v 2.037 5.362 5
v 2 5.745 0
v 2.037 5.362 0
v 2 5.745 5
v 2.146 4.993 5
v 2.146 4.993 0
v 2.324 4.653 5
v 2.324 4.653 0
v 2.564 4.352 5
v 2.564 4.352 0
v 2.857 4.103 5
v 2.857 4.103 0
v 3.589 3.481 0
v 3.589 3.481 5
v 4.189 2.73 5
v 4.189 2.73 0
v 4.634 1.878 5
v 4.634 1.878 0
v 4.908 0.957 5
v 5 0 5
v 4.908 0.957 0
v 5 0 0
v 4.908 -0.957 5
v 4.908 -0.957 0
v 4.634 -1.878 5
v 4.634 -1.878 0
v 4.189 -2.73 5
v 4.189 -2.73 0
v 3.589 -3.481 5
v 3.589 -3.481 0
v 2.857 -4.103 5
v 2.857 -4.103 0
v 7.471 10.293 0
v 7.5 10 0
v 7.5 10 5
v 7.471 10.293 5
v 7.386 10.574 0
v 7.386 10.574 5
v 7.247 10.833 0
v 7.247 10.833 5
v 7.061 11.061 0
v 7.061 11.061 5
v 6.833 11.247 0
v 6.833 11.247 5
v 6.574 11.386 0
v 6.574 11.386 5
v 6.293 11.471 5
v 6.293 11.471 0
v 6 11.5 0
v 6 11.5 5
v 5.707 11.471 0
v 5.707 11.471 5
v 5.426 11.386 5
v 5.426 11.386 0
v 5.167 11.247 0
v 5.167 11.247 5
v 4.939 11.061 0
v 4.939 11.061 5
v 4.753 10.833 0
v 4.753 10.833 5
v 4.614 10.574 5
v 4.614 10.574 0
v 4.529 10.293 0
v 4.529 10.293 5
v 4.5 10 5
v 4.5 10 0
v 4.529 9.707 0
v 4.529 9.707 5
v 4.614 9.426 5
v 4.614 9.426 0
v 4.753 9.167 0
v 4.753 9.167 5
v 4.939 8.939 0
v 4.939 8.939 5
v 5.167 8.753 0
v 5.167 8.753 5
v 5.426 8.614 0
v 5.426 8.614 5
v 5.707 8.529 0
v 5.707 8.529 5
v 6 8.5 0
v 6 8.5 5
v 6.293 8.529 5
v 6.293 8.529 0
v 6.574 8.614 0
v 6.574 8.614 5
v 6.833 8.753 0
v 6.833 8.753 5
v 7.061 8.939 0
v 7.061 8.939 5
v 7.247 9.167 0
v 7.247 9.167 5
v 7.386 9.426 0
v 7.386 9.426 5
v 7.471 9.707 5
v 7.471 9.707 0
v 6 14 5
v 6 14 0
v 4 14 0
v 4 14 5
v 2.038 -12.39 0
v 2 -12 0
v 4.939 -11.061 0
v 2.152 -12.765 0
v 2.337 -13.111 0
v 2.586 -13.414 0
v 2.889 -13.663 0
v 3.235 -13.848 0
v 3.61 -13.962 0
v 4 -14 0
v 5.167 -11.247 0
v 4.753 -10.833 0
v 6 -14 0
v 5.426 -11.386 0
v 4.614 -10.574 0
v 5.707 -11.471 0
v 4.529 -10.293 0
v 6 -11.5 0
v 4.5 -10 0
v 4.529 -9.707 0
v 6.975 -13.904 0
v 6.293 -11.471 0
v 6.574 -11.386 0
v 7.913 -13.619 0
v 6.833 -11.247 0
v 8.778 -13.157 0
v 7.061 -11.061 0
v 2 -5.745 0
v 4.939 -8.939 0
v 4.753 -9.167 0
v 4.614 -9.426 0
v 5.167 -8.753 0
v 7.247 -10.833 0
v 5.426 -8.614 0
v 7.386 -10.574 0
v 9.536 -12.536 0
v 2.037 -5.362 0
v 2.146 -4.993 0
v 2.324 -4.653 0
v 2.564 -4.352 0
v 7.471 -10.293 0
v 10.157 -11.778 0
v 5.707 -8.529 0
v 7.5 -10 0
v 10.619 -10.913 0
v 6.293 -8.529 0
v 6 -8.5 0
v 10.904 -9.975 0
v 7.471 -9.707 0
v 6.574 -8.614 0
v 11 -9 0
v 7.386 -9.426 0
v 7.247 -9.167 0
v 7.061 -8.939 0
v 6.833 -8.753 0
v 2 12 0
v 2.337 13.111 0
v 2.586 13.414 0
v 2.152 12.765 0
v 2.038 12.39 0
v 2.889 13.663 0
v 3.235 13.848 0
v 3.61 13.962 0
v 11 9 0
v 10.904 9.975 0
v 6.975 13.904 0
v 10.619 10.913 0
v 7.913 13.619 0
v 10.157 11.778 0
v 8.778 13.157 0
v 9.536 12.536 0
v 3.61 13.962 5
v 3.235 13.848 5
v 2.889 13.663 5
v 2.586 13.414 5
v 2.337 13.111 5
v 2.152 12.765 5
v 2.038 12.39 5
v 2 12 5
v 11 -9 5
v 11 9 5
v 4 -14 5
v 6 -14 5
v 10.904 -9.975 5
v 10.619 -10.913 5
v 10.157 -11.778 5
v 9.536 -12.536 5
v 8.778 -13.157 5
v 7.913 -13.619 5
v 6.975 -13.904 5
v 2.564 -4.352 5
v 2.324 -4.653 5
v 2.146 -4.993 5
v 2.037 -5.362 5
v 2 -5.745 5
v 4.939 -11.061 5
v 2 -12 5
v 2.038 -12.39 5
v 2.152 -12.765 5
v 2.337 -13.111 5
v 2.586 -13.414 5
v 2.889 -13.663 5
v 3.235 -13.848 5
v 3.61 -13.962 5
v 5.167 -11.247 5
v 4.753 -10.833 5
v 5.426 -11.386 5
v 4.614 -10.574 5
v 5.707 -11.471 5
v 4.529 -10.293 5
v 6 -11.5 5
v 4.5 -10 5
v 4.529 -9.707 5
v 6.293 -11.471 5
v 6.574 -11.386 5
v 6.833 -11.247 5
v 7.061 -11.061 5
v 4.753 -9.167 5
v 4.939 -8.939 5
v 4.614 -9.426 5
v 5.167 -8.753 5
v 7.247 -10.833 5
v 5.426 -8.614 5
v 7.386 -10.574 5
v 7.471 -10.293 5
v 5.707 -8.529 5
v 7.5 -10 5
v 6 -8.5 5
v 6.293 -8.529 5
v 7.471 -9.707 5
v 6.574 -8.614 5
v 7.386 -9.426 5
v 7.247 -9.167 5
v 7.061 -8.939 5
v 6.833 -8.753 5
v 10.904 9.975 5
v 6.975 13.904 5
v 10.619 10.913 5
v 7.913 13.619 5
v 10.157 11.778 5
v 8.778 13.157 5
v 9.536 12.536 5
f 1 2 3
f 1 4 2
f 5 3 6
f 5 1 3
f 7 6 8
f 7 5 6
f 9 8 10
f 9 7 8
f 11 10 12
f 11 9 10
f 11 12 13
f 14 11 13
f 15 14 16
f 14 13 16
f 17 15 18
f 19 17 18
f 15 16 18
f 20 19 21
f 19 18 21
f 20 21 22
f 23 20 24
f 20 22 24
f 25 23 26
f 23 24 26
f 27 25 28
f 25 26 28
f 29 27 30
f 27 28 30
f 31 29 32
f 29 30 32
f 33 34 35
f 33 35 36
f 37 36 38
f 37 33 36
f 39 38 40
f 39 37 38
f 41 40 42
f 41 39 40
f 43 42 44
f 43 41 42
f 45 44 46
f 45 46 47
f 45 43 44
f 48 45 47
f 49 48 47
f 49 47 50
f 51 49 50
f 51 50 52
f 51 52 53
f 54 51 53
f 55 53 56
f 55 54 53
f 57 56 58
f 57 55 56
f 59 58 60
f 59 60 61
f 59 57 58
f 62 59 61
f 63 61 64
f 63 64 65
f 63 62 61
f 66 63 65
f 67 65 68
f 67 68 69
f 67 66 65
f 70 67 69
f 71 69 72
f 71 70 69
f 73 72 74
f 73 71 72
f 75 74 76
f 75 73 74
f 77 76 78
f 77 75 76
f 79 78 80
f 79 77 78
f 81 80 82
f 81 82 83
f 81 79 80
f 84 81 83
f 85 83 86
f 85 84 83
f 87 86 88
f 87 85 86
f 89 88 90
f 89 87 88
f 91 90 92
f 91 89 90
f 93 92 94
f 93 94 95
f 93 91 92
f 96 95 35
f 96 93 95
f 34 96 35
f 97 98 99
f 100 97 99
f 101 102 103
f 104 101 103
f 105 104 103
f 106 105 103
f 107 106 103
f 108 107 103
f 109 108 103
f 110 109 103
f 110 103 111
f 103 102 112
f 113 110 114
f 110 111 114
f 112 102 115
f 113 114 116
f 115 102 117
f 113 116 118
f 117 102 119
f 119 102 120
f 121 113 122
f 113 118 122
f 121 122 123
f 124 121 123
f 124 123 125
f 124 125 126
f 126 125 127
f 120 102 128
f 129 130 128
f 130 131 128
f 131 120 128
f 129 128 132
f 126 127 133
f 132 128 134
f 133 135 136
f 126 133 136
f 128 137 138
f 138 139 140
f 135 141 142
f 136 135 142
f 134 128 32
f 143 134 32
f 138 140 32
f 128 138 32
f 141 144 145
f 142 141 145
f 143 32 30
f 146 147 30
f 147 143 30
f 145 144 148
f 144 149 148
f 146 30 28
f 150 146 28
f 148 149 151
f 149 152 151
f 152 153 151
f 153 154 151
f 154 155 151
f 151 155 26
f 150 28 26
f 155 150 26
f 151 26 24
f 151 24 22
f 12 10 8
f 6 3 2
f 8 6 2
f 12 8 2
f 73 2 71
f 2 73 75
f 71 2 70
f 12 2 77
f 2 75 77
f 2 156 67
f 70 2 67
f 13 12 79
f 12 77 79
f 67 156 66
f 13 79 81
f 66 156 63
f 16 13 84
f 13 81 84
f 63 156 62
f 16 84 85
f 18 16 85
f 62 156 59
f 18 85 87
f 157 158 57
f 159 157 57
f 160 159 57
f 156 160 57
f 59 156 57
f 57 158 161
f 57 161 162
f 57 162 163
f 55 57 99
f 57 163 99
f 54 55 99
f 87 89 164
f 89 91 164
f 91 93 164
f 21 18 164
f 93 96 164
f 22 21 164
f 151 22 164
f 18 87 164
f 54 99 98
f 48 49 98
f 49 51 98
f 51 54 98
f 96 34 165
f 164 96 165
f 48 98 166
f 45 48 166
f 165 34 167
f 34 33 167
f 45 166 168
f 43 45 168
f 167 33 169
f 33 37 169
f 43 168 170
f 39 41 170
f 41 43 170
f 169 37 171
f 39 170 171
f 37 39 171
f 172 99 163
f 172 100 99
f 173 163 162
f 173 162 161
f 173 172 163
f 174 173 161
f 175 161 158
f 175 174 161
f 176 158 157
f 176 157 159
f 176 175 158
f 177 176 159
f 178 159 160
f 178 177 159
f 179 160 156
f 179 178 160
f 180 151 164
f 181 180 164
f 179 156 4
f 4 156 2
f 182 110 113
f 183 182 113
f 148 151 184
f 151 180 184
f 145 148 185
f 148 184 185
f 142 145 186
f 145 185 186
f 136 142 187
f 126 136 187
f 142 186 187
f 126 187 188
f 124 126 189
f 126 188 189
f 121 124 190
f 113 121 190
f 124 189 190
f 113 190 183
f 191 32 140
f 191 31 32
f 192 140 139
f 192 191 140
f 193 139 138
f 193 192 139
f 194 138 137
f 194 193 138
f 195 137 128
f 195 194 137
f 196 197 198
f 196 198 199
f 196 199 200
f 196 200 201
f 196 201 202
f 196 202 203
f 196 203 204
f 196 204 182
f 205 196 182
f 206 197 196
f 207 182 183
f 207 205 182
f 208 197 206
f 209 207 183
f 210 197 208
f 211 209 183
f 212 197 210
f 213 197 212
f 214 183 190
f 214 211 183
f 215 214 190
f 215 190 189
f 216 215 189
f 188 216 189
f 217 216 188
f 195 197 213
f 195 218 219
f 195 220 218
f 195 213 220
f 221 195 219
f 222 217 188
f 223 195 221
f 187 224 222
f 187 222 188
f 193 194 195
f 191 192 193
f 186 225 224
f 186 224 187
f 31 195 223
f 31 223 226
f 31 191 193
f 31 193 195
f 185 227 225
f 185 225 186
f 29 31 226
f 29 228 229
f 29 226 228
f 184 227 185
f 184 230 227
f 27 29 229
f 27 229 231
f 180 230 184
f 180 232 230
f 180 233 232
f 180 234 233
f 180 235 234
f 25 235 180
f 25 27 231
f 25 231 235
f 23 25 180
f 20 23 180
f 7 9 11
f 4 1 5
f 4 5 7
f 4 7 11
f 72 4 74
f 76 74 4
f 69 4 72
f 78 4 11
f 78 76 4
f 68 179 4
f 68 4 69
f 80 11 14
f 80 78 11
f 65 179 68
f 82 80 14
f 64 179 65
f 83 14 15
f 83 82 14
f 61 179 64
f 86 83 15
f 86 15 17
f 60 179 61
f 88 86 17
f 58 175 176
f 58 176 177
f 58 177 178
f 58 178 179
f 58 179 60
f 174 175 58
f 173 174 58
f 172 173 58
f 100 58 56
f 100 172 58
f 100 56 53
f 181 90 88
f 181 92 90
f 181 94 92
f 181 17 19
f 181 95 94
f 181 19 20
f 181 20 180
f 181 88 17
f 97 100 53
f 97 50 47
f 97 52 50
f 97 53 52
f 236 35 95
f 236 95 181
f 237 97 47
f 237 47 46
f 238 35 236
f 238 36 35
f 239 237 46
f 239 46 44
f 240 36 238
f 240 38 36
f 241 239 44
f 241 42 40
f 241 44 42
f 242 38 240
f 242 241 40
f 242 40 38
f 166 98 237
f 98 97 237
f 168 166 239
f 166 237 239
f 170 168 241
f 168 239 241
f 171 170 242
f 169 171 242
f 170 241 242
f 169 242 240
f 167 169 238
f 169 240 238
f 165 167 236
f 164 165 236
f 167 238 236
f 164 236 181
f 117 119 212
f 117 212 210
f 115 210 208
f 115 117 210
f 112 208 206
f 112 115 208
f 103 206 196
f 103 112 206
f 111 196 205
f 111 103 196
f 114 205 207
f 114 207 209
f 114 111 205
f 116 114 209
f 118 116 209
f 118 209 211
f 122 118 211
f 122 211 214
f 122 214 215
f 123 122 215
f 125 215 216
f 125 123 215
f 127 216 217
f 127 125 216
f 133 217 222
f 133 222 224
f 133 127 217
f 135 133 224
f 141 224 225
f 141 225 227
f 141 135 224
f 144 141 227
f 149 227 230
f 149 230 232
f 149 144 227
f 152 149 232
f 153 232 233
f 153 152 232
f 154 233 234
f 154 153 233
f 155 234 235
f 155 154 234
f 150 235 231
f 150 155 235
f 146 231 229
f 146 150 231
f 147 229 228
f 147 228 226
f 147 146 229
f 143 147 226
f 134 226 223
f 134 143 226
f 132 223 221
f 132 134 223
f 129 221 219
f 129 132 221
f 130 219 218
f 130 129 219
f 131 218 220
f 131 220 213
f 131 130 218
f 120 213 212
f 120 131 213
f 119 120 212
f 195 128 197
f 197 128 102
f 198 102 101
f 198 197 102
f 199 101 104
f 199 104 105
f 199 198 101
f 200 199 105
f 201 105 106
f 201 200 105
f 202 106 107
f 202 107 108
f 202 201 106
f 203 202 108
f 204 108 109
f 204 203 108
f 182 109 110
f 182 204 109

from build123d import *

# Parameters (mm, degrees)
ESQUISSE1_R        = 1.5
BOSS_EXTRU_1_DEPTH = 5
CONG_1_R           = 5
CONG_2_R           = 2


with BuildPart() as part:
    # Esquisse1 → Boss.-Extru.1 (new body)
    with BuildSketch(Plane.XY):
        with BuildLine():
            Line((2, 14), (2, 4.582575695))
            ThreePointArc((2, 4.582575695), (5, 0), (2, -4.582575695))
            Line((2, -4.582575695), (2, -14))
            Line((2, -14), (11, -14))
            Line((11, -14), (11, 14))
            Line((11, 14), (2, 14))
        make_face()
        with Locations((6, 10)):
            Circle(ESQUISSE1_R, mode=Mode.SUBTRACT)
        with Locations(Location((6, -10, 0), (0, 0, 180))):
            Circle(ESQUISSE1_R, mode=Mode.SUBTRACT)
    extrude(amount=BOSS_EXTRU_1_DEPTH)

    # Congé1
    cong_1_edges = [part.edges().sort_by_distance(p)[0] for p in [
        (11, 14, 2.5),
        (11, -14, 2.5),
    ]]
    fillet(cong_1_edges, radius=CONG_1_R)

    # Congé2
    cong_2_edges = [part.edges().sort_by_distance(p)[0] for p in [
        (2, -14, 2.5),
        (2, -4.582575695, 2.5),
        (2, 4.582575695, 2.5),
        (2, 14, 2.5),
    ]]
    fillet(cong_2_edges, radius=CONG_2_R)


solid = part.part
